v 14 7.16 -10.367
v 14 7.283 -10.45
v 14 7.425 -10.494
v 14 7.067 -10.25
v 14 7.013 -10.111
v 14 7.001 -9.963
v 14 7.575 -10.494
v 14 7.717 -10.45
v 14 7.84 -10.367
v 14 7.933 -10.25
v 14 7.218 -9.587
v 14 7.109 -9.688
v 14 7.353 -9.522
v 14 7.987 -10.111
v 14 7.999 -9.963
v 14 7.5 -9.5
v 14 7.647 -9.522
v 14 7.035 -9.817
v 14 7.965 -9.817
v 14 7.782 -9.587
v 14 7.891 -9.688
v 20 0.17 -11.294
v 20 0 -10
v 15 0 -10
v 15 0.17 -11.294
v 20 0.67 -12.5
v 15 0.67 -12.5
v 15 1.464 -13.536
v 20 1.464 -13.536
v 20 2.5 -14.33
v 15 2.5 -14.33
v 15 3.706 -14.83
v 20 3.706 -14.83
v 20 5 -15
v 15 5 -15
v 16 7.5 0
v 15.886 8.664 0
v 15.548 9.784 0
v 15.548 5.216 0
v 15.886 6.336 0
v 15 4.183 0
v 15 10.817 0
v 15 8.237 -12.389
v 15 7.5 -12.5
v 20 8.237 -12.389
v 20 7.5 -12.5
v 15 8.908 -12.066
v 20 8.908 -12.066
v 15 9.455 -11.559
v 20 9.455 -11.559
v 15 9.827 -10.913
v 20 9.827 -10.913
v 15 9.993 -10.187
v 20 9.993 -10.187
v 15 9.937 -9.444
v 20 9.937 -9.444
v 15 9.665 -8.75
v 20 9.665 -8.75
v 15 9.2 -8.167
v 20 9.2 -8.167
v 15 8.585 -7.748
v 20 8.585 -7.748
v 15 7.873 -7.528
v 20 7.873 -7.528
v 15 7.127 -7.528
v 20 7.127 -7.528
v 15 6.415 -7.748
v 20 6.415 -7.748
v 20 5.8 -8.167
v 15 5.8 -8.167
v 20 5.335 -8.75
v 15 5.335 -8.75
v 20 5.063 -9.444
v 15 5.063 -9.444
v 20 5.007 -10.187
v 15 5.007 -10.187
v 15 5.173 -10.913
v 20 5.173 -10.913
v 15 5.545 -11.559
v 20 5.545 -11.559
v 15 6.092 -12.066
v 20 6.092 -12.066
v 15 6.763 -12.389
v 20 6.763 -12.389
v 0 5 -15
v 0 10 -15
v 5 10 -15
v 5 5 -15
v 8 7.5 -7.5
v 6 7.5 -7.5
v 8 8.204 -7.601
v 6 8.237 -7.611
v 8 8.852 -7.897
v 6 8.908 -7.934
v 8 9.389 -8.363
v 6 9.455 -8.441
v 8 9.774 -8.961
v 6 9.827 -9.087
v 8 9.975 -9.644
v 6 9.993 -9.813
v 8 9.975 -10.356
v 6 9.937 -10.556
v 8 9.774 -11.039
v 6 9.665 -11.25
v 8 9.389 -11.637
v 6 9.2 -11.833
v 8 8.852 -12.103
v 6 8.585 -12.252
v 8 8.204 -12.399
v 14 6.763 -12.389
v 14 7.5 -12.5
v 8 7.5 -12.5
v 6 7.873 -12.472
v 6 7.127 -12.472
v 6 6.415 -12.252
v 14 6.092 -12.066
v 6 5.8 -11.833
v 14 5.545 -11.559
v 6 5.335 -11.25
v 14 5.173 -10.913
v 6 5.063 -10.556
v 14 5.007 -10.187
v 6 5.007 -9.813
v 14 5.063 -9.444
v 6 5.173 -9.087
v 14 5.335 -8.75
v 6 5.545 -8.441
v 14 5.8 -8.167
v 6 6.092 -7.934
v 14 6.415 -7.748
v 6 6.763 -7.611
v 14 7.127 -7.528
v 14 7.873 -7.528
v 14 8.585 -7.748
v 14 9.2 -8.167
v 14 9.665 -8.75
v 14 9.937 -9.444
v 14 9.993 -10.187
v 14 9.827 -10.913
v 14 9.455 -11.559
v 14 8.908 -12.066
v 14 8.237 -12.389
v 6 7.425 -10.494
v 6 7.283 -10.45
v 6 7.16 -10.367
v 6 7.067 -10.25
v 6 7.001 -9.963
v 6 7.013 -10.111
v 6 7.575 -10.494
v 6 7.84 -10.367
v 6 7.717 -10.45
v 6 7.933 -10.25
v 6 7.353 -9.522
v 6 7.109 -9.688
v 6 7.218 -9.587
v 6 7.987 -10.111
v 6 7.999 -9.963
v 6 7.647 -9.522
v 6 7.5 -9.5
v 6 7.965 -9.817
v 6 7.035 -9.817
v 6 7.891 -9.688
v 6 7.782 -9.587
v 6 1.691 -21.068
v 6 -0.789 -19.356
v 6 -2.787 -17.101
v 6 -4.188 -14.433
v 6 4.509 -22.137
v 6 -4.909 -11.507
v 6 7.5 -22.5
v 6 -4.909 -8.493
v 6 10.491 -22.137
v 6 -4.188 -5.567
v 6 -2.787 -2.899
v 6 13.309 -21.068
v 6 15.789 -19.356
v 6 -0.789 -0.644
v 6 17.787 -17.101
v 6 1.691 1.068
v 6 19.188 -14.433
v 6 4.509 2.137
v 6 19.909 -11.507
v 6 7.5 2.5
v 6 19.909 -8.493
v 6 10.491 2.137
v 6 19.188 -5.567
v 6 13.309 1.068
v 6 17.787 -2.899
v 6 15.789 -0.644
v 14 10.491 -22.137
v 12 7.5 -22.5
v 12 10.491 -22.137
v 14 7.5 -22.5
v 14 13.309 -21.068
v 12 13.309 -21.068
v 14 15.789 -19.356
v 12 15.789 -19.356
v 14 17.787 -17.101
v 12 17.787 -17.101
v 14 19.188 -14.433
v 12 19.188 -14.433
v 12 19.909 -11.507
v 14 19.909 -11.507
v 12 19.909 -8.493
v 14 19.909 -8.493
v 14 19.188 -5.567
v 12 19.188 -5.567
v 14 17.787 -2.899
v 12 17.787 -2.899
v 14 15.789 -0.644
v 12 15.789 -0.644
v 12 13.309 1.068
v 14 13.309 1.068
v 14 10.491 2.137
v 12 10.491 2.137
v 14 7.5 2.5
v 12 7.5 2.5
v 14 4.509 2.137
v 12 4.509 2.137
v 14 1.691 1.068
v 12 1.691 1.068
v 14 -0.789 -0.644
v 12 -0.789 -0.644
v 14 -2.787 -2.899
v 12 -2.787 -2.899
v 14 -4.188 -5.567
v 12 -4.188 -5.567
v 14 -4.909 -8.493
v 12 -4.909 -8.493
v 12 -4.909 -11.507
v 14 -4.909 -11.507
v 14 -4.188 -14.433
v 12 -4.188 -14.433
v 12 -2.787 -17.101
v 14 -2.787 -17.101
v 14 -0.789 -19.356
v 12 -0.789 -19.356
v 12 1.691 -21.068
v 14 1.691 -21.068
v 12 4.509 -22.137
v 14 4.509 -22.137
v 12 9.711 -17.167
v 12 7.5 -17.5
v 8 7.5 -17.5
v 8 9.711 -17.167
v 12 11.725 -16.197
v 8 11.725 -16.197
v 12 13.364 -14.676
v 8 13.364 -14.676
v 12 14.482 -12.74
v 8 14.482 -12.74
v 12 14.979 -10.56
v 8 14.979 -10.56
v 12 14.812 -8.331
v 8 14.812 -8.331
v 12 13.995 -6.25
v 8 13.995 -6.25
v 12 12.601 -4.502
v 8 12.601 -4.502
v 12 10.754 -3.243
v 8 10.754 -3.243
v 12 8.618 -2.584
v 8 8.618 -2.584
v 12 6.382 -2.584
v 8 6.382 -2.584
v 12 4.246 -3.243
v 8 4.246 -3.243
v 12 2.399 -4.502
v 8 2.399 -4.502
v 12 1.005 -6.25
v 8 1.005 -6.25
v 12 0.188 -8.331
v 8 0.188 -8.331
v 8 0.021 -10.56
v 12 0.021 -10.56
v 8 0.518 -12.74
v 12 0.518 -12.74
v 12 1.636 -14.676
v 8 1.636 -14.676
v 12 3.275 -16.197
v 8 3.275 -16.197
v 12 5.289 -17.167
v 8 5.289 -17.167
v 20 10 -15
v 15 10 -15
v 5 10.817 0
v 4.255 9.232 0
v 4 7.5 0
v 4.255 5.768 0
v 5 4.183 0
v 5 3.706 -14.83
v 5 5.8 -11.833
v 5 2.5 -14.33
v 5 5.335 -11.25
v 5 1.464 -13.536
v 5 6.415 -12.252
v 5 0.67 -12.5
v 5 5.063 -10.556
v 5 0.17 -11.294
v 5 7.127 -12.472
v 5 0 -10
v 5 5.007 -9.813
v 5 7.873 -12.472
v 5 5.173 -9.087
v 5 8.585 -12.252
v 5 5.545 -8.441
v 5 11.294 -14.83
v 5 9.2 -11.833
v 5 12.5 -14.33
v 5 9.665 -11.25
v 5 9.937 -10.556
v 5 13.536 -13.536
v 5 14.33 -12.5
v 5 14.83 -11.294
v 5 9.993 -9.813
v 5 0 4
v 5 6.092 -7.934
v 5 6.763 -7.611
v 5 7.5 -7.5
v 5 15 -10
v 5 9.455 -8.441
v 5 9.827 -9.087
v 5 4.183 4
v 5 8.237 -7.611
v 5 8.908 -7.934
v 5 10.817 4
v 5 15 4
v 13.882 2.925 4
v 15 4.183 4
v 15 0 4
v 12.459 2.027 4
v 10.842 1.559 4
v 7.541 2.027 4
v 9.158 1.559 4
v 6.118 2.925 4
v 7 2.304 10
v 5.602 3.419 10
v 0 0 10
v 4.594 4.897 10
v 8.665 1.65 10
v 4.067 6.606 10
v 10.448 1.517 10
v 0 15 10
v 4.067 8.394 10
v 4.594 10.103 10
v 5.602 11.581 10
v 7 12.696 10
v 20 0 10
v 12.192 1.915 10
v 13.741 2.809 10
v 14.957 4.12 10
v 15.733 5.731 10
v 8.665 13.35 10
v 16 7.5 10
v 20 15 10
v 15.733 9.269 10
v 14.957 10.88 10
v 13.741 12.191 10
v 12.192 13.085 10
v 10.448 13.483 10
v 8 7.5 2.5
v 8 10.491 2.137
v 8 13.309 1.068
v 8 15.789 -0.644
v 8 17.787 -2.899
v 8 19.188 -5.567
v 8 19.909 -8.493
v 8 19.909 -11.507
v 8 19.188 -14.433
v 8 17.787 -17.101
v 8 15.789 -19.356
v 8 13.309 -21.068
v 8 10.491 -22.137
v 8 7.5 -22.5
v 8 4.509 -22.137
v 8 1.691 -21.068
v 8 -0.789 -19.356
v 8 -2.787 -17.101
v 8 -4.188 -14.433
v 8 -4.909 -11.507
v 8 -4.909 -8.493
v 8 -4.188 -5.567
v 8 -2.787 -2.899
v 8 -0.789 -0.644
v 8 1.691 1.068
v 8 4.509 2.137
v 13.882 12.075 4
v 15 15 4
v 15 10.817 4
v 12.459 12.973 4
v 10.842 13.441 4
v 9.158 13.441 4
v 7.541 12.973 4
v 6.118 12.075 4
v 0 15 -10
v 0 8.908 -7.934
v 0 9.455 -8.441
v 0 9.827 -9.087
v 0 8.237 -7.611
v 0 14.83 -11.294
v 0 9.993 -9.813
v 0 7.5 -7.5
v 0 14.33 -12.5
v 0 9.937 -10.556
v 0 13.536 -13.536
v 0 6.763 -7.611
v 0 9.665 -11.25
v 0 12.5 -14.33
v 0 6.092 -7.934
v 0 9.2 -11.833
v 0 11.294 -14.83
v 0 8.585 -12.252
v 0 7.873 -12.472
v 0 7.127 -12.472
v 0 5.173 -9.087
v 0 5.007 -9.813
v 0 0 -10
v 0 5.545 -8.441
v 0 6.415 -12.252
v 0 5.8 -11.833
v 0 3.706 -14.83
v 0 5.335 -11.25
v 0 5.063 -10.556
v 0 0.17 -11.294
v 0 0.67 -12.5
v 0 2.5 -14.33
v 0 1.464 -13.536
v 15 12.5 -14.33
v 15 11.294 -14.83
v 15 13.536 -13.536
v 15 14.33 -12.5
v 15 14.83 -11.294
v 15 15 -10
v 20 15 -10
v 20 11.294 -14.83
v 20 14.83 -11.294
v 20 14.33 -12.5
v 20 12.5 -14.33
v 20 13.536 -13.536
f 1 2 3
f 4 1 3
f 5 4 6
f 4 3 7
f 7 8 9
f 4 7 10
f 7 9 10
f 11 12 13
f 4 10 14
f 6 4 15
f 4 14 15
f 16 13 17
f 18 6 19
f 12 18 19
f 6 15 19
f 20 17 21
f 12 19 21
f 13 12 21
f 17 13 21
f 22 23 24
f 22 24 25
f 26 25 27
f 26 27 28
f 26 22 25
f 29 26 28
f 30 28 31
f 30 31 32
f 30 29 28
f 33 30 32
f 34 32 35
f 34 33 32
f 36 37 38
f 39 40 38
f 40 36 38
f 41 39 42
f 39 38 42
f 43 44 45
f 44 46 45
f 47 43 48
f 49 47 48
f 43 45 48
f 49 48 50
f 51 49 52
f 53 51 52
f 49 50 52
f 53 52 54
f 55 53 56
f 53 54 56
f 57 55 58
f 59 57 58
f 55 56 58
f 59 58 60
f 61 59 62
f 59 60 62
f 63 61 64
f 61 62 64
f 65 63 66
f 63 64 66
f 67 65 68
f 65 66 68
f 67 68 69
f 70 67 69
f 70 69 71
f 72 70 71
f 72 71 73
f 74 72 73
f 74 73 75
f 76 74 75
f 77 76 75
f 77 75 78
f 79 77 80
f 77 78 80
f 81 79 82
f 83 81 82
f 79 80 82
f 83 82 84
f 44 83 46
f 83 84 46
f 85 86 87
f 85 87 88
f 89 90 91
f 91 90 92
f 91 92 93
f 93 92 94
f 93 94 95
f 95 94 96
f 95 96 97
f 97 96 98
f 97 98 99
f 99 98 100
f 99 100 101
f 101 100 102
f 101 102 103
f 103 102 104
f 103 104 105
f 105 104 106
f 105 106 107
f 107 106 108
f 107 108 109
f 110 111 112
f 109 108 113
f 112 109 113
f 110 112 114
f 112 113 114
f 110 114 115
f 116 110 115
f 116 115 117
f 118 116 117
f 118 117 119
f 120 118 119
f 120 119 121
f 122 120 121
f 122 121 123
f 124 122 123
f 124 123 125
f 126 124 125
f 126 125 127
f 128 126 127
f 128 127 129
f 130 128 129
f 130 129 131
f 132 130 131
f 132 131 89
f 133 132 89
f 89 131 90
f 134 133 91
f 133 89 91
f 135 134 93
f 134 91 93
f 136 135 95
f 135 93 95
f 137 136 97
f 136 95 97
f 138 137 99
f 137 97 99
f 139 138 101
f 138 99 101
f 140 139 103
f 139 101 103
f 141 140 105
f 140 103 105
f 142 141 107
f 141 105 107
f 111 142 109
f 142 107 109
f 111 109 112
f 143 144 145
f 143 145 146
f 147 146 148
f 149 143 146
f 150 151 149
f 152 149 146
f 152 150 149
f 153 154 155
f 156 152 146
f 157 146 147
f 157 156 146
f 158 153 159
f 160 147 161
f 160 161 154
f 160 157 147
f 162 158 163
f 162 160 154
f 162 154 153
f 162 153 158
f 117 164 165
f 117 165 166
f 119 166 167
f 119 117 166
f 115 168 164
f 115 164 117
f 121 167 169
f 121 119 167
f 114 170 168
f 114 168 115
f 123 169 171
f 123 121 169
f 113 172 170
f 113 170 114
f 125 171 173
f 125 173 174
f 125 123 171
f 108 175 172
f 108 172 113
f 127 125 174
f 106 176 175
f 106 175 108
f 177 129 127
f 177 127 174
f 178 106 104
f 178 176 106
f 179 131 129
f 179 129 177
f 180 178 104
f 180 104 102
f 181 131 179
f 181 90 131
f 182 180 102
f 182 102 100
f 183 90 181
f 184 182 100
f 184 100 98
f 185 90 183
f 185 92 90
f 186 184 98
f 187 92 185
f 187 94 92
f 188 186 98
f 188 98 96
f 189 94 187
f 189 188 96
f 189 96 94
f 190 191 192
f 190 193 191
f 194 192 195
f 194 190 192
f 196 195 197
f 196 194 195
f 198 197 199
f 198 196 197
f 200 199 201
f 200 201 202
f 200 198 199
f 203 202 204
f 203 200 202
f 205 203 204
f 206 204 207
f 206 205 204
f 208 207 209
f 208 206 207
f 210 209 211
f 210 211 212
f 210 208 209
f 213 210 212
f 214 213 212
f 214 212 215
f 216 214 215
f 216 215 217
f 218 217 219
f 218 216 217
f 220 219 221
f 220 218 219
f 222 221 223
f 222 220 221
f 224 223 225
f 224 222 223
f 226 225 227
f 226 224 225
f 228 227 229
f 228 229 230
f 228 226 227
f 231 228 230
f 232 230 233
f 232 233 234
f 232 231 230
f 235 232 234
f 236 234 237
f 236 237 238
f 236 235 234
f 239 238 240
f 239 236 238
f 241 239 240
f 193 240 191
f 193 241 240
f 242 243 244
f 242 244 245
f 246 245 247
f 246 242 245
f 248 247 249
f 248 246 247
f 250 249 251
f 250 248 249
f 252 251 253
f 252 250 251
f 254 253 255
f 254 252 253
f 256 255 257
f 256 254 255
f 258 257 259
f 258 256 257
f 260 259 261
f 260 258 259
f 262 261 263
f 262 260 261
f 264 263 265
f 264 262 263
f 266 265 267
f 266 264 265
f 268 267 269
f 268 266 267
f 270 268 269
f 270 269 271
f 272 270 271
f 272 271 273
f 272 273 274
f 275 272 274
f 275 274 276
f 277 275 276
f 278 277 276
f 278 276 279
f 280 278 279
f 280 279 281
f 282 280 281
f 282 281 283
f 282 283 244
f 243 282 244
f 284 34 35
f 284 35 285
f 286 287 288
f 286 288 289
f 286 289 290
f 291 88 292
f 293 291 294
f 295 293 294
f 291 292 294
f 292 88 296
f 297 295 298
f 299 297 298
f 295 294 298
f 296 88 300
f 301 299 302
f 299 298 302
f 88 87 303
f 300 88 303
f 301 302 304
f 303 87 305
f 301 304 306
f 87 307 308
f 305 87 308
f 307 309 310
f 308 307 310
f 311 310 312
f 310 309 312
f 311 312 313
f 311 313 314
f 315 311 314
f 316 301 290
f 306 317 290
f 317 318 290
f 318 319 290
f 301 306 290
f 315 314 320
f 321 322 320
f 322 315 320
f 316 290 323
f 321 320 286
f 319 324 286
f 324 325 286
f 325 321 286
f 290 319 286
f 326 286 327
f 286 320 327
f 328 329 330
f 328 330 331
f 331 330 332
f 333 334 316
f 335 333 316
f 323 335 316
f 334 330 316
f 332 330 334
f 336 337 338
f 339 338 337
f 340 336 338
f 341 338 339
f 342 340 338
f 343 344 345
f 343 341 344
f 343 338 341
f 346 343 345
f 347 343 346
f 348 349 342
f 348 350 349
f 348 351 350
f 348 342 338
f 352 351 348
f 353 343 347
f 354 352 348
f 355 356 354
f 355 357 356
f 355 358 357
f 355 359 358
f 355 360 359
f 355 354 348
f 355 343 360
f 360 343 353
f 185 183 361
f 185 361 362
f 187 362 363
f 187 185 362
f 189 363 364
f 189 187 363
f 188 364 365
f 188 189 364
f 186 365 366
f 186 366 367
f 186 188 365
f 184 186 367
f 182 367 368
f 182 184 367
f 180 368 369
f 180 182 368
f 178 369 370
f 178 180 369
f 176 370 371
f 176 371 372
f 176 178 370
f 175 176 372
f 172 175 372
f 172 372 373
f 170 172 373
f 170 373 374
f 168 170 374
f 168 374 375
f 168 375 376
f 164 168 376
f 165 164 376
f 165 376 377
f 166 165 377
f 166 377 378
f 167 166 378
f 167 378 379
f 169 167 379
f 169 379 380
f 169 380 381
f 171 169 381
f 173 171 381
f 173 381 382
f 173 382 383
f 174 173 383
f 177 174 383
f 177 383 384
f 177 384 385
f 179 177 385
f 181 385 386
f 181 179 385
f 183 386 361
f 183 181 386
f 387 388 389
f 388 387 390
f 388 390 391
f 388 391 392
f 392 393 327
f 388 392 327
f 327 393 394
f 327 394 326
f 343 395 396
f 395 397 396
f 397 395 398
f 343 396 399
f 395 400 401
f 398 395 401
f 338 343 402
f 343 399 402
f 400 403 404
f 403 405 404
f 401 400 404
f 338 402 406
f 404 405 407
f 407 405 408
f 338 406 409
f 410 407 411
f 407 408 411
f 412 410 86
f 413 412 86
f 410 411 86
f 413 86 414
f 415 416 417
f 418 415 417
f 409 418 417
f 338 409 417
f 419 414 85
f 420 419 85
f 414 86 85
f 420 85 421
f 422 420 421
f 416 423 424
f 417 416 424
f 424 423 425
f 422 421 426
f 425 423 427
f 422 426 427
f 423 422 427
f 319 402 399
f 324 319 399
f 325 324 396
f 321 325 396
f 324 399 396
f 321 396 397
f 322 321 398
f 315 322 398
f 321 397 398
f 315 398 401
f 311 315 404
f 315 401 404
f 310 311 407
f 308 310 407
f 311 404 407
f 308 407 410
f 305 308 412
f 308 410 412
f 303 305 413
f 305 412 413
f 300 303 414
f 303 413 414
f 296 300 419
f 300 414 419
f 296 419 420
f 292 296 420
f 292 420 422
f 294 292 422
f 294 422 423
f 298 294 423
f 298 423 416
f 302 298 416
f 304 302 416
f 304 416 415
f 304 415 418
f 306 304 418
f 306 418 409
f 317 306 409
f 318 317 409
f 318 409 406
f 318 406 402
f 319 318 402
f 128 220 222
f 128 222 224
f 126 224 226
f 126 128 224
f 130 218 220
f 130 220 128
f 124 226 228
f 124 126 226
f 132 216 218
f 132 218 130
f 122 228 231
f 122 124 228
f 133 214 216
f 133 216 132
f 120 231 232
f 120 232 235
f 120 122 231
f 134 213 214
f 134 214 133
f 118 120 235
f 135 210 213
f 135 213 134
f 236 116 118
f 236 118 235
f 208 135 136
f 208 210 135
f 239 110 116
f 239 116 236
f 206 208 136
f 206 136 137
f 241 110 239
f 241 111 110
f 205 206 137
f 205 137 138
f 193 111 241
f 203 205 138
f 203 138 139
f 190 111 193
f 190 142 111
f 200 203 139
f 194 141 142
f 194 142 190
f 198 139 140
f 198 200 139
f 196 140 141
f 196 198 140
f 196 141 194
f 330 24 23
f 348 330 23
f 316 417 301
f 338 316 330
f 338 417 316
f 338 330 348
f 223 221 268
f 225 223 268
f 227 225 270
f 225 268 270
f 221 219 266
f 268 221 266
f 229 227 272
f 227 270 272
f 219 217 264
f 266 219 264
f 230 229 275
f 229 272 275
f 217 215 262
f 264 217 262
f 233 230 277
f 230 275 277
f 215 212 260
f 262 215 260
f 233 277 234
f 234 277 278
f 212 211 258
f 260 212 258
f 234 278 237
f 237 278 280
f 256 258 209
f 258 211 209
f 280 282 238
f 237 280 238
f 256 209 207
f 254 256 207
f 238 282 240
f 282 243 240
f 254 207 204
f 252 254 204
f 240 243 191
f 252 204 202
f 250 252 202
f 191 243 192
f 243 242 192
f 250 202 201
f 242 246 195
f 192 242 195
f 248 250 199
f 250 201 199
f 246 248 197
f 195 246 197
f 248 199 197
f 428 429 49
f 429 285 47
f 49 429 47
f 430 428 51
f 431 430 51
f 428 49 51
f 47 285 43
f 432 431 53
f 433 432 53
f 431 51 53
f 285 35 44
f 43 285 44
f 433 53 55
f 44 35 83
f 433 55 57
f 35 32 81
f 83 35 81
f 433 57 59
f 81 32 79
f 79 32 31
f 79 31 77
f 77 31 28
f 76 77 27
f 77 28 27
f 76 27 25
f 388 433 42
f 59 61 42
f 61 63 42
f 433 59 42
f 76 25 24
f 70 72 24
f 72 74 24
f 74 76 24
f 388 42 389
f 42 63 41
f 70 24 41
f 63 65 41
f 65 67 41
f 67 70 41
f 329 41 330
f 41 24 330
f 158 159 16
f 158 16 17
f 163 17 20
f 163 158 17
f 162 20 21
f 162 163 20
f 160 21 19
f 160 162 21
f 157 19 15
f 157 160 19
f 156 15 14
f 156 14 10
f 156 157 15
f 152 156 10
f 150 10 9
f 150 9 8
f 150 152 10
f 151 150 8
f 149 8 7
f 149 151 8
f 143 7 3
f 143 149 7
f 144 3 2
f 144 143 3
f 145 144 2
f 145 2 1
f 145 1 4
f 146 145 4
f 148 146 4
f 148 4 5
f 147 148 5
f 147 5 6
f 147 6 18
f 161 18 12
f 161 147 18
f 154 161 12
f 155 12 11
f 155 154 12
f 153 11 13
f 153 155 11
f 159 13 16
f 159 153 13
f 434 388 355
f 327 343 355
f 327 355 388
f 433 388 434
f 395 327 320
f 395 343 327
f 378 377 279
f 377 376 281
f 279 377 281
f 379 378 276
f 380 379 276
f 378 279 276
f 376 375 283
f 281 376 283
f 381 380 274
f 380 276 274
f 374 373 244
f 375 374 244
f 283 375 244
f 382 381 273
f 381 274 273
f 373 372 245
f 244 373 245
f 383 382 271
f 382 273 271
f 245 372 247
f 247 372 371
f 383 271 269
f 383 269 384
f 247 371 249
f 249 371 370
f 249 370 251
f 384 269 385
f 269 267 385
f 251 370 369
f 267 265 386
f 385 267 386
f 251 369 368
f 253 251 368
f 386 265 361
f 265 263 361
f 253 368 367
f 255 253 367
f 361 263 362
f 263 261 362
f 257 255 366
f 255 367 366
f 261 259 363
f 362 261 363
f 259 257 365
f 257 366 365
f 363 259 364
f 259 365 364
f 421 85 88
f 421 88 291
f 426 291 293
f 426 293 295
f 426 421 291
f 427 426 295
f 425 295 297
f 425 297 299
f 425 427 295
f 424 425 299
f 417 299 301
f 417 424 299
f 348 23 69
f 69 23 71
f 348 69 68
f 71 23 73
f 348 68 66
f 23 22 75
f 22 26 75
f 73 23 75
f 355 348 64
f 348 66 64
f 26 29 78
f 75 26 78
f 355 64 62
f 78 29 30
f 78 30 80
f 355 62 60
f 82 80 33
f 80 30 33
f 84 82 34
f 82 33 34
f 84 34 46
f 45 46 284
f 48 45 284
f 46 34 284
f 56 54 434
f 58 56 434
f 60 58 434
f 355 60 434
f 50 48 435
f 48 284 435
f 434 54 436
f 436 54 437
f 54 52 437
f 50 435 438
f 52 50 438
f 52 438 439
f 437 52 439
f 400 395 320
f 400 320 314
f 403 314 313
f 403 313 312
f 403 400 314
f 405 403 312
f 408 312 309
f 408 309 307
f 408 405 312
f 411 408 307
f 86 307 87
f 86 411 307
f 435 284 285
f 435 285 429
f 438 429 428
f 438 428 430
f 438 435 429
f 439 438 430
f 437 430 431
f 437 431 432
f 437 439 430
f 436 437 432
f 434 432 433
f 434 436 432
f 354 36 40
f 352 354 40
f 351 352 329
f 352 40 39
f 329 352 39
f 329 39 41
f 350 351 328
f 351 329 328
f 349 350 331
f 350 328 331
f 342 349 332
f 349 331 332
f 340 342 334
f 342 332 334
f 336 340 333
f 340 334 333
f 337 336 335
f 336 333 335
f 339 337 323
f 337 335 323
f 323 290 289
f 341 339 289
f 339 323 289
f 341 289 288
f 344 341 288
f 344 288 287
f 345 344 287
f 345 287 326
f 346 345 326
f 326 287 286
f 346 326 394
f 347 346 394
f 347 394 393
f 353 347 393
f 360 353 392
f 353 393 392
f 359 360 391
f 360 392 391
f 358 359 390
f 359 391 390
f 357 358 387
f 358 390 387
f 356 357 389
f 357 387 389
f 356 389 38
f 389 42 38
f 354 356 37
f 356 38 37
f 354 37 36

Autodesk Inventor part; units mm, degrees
sketch "Boceto1" plane through (0, 0, 0) normal (0, 0, 1) x (1, 0, 0)
  line L0 (0, 0) -> (20, 0)
  line L1 (20, 0) -> (20, 15)
  line L2 (20, 15) -> (0, 15)
  line L3 (0, 15) -> (0, 0)
  circle A0 centre (10, 7.5) radius 6
  dimension "d0" = 20
  dimension "d1" = 15
  dimension "d3" = 12
extrude "Extrusión1" add sketch "Boceto1" along normal blind 10
sketch "Boceto2" plane through (20, 0, 0) normal (1, 0, 0) x (0, 0, -1)
  line L0 (0, 0) -> (10, 0)
  line L1 (15, 5) -> (15, 10)
  line L2 (0, 0) -> (0, 15) projected
  line L3 (10, 15) -> (0, 15)
  arc A0 (15, 10) -> (10, 15) centre (10, 10) ccw
  arc A1 (10, 0) -> (15, 5) centre (10, 5) ccw
  circle A2 centre (10, 7.5) radius 2.5
  point P0 (15, 0)
  point P1 (15, 15)
  dimension "d6" = 15
  dimension "d7" = 15
  dimension "d9" = 5
  dimension "d10" = 5
  dimension "d11" = 5
extrude "Extrusión2" add sketch "Boceto2" against normal blind 5
sketch "Boceto3" plane through (0, 0, 0) normal (-1, 0, 0) x (0, 0, 1)
  line L0 (0, 15) -> (0, 10.8166) projected
  line L1 (0, 15) -> (-10, 15)
  line L2 (-15, 10) -> (-15, 5)
  line L3 (-10, 0) -> (0, 0)
  arc A0 (-10, 15) -> (-15, 10) centre (-10, 10) ccw
  arc A1 (-15, 5) -> (-10, 0) centre (-10, 5) ccw
  circle A2 centre (-10, 7.5) radius 2.5
  line L4 (0, 15) -> (0, 0)
  point P0 (-10, 15)
  point P1 (-15, 15)
  dimension "d14" = 15
  dimension "d15" = 5
  dimension "d16" = 5
extrude "Extrusión3" add sketch "Boceto3" against normal blind 5
ref_plane "Plano de trabajo1" through (14, 0, 10) normal (1, 0, 0) x (0, 0, -1)
ref_plane "Plano de trabajo3" through (6, 0, 10) normal (-1, 0, 0) x (0, 0, 1)
sketch "Boceto7" plane through (0, 0, 10) normal (0, -1, 0) x (1, 0, 0)
  line L0 (5, -10) -> (15, -10) projected
  line L1 (5, -10) -> (15, -10)
  line L2 (15, -10) -> (15, -6)
  line L3 (15, -6) -> (5, -6)
  line L4 (5, -6) -> (5, -10)
  point P0 (0, -10)
  dimension "d31" = 10
  dimension "d32" = 4
extrude "Extrusión7" cut sketch "Boceto7" against normal blind 15
sketch "Boceto8" plane through (14, 0, 10) normal (1, 0, 0) x (0, 0, -1)
  circle A0 centre (20, 7.5) radius 2.5 projected
  circle A1 centre (20, 7.5) radius 12.5
  point P0 (10, 0)
  dimension "d35" = 25
extrude "Extrusión8" add sketch "Boceto8" against normal blind 2
ref_plane "Plano de trabajo4" through (12, 7.5, -10) normal (1, 0, 0) x (0, 0, -1)
sketch "Boceto9" plane through (12, 7.5, -10) normal (1, 0, 0) x (0, 0, -1)
  circle A0 centre (0, 0) radius 7.5
  point P0 (-10, -7.5)
  dimension "d39" = 15
extrude "Extrusión9" add sketch "Boceto9" against normal blind 4
sketch "Boceto10" plane through (6, 0, 10) normal (-1, 0, 0) x (0, 0, 1)
  circle A0 centre (-20, 7.5) radius 2.5 projected
  circle A1 centre (-20, 7.5) radius 12.5
  circle A2 centre (-20, 7.5) radius 0.5
  circle A3 centre (-20, 7.5) radius 1.5
  point P0 (-10, 0)
  dimension "d42" = 25
  dimension "d47" = 1
  dimension "d48" = 3
extrude "Extrusión10" add sketch "Boceto10" against normal blind 2 contours A1
sketch "Boceto11" plane through (12, 7.5, -10) normal (1, 0, 0) x (0, 0, -1)
  circle A0 centre (0, 0) radius 2.5
  point P0 (-10, -7.5)
extrude "Extrusión11" cut sketch "Boceto11" against normal blind 6
extrude "Extrusión12" add sketch "Boceto10" against normal blind 8 contours A2
properties part number "polea"
